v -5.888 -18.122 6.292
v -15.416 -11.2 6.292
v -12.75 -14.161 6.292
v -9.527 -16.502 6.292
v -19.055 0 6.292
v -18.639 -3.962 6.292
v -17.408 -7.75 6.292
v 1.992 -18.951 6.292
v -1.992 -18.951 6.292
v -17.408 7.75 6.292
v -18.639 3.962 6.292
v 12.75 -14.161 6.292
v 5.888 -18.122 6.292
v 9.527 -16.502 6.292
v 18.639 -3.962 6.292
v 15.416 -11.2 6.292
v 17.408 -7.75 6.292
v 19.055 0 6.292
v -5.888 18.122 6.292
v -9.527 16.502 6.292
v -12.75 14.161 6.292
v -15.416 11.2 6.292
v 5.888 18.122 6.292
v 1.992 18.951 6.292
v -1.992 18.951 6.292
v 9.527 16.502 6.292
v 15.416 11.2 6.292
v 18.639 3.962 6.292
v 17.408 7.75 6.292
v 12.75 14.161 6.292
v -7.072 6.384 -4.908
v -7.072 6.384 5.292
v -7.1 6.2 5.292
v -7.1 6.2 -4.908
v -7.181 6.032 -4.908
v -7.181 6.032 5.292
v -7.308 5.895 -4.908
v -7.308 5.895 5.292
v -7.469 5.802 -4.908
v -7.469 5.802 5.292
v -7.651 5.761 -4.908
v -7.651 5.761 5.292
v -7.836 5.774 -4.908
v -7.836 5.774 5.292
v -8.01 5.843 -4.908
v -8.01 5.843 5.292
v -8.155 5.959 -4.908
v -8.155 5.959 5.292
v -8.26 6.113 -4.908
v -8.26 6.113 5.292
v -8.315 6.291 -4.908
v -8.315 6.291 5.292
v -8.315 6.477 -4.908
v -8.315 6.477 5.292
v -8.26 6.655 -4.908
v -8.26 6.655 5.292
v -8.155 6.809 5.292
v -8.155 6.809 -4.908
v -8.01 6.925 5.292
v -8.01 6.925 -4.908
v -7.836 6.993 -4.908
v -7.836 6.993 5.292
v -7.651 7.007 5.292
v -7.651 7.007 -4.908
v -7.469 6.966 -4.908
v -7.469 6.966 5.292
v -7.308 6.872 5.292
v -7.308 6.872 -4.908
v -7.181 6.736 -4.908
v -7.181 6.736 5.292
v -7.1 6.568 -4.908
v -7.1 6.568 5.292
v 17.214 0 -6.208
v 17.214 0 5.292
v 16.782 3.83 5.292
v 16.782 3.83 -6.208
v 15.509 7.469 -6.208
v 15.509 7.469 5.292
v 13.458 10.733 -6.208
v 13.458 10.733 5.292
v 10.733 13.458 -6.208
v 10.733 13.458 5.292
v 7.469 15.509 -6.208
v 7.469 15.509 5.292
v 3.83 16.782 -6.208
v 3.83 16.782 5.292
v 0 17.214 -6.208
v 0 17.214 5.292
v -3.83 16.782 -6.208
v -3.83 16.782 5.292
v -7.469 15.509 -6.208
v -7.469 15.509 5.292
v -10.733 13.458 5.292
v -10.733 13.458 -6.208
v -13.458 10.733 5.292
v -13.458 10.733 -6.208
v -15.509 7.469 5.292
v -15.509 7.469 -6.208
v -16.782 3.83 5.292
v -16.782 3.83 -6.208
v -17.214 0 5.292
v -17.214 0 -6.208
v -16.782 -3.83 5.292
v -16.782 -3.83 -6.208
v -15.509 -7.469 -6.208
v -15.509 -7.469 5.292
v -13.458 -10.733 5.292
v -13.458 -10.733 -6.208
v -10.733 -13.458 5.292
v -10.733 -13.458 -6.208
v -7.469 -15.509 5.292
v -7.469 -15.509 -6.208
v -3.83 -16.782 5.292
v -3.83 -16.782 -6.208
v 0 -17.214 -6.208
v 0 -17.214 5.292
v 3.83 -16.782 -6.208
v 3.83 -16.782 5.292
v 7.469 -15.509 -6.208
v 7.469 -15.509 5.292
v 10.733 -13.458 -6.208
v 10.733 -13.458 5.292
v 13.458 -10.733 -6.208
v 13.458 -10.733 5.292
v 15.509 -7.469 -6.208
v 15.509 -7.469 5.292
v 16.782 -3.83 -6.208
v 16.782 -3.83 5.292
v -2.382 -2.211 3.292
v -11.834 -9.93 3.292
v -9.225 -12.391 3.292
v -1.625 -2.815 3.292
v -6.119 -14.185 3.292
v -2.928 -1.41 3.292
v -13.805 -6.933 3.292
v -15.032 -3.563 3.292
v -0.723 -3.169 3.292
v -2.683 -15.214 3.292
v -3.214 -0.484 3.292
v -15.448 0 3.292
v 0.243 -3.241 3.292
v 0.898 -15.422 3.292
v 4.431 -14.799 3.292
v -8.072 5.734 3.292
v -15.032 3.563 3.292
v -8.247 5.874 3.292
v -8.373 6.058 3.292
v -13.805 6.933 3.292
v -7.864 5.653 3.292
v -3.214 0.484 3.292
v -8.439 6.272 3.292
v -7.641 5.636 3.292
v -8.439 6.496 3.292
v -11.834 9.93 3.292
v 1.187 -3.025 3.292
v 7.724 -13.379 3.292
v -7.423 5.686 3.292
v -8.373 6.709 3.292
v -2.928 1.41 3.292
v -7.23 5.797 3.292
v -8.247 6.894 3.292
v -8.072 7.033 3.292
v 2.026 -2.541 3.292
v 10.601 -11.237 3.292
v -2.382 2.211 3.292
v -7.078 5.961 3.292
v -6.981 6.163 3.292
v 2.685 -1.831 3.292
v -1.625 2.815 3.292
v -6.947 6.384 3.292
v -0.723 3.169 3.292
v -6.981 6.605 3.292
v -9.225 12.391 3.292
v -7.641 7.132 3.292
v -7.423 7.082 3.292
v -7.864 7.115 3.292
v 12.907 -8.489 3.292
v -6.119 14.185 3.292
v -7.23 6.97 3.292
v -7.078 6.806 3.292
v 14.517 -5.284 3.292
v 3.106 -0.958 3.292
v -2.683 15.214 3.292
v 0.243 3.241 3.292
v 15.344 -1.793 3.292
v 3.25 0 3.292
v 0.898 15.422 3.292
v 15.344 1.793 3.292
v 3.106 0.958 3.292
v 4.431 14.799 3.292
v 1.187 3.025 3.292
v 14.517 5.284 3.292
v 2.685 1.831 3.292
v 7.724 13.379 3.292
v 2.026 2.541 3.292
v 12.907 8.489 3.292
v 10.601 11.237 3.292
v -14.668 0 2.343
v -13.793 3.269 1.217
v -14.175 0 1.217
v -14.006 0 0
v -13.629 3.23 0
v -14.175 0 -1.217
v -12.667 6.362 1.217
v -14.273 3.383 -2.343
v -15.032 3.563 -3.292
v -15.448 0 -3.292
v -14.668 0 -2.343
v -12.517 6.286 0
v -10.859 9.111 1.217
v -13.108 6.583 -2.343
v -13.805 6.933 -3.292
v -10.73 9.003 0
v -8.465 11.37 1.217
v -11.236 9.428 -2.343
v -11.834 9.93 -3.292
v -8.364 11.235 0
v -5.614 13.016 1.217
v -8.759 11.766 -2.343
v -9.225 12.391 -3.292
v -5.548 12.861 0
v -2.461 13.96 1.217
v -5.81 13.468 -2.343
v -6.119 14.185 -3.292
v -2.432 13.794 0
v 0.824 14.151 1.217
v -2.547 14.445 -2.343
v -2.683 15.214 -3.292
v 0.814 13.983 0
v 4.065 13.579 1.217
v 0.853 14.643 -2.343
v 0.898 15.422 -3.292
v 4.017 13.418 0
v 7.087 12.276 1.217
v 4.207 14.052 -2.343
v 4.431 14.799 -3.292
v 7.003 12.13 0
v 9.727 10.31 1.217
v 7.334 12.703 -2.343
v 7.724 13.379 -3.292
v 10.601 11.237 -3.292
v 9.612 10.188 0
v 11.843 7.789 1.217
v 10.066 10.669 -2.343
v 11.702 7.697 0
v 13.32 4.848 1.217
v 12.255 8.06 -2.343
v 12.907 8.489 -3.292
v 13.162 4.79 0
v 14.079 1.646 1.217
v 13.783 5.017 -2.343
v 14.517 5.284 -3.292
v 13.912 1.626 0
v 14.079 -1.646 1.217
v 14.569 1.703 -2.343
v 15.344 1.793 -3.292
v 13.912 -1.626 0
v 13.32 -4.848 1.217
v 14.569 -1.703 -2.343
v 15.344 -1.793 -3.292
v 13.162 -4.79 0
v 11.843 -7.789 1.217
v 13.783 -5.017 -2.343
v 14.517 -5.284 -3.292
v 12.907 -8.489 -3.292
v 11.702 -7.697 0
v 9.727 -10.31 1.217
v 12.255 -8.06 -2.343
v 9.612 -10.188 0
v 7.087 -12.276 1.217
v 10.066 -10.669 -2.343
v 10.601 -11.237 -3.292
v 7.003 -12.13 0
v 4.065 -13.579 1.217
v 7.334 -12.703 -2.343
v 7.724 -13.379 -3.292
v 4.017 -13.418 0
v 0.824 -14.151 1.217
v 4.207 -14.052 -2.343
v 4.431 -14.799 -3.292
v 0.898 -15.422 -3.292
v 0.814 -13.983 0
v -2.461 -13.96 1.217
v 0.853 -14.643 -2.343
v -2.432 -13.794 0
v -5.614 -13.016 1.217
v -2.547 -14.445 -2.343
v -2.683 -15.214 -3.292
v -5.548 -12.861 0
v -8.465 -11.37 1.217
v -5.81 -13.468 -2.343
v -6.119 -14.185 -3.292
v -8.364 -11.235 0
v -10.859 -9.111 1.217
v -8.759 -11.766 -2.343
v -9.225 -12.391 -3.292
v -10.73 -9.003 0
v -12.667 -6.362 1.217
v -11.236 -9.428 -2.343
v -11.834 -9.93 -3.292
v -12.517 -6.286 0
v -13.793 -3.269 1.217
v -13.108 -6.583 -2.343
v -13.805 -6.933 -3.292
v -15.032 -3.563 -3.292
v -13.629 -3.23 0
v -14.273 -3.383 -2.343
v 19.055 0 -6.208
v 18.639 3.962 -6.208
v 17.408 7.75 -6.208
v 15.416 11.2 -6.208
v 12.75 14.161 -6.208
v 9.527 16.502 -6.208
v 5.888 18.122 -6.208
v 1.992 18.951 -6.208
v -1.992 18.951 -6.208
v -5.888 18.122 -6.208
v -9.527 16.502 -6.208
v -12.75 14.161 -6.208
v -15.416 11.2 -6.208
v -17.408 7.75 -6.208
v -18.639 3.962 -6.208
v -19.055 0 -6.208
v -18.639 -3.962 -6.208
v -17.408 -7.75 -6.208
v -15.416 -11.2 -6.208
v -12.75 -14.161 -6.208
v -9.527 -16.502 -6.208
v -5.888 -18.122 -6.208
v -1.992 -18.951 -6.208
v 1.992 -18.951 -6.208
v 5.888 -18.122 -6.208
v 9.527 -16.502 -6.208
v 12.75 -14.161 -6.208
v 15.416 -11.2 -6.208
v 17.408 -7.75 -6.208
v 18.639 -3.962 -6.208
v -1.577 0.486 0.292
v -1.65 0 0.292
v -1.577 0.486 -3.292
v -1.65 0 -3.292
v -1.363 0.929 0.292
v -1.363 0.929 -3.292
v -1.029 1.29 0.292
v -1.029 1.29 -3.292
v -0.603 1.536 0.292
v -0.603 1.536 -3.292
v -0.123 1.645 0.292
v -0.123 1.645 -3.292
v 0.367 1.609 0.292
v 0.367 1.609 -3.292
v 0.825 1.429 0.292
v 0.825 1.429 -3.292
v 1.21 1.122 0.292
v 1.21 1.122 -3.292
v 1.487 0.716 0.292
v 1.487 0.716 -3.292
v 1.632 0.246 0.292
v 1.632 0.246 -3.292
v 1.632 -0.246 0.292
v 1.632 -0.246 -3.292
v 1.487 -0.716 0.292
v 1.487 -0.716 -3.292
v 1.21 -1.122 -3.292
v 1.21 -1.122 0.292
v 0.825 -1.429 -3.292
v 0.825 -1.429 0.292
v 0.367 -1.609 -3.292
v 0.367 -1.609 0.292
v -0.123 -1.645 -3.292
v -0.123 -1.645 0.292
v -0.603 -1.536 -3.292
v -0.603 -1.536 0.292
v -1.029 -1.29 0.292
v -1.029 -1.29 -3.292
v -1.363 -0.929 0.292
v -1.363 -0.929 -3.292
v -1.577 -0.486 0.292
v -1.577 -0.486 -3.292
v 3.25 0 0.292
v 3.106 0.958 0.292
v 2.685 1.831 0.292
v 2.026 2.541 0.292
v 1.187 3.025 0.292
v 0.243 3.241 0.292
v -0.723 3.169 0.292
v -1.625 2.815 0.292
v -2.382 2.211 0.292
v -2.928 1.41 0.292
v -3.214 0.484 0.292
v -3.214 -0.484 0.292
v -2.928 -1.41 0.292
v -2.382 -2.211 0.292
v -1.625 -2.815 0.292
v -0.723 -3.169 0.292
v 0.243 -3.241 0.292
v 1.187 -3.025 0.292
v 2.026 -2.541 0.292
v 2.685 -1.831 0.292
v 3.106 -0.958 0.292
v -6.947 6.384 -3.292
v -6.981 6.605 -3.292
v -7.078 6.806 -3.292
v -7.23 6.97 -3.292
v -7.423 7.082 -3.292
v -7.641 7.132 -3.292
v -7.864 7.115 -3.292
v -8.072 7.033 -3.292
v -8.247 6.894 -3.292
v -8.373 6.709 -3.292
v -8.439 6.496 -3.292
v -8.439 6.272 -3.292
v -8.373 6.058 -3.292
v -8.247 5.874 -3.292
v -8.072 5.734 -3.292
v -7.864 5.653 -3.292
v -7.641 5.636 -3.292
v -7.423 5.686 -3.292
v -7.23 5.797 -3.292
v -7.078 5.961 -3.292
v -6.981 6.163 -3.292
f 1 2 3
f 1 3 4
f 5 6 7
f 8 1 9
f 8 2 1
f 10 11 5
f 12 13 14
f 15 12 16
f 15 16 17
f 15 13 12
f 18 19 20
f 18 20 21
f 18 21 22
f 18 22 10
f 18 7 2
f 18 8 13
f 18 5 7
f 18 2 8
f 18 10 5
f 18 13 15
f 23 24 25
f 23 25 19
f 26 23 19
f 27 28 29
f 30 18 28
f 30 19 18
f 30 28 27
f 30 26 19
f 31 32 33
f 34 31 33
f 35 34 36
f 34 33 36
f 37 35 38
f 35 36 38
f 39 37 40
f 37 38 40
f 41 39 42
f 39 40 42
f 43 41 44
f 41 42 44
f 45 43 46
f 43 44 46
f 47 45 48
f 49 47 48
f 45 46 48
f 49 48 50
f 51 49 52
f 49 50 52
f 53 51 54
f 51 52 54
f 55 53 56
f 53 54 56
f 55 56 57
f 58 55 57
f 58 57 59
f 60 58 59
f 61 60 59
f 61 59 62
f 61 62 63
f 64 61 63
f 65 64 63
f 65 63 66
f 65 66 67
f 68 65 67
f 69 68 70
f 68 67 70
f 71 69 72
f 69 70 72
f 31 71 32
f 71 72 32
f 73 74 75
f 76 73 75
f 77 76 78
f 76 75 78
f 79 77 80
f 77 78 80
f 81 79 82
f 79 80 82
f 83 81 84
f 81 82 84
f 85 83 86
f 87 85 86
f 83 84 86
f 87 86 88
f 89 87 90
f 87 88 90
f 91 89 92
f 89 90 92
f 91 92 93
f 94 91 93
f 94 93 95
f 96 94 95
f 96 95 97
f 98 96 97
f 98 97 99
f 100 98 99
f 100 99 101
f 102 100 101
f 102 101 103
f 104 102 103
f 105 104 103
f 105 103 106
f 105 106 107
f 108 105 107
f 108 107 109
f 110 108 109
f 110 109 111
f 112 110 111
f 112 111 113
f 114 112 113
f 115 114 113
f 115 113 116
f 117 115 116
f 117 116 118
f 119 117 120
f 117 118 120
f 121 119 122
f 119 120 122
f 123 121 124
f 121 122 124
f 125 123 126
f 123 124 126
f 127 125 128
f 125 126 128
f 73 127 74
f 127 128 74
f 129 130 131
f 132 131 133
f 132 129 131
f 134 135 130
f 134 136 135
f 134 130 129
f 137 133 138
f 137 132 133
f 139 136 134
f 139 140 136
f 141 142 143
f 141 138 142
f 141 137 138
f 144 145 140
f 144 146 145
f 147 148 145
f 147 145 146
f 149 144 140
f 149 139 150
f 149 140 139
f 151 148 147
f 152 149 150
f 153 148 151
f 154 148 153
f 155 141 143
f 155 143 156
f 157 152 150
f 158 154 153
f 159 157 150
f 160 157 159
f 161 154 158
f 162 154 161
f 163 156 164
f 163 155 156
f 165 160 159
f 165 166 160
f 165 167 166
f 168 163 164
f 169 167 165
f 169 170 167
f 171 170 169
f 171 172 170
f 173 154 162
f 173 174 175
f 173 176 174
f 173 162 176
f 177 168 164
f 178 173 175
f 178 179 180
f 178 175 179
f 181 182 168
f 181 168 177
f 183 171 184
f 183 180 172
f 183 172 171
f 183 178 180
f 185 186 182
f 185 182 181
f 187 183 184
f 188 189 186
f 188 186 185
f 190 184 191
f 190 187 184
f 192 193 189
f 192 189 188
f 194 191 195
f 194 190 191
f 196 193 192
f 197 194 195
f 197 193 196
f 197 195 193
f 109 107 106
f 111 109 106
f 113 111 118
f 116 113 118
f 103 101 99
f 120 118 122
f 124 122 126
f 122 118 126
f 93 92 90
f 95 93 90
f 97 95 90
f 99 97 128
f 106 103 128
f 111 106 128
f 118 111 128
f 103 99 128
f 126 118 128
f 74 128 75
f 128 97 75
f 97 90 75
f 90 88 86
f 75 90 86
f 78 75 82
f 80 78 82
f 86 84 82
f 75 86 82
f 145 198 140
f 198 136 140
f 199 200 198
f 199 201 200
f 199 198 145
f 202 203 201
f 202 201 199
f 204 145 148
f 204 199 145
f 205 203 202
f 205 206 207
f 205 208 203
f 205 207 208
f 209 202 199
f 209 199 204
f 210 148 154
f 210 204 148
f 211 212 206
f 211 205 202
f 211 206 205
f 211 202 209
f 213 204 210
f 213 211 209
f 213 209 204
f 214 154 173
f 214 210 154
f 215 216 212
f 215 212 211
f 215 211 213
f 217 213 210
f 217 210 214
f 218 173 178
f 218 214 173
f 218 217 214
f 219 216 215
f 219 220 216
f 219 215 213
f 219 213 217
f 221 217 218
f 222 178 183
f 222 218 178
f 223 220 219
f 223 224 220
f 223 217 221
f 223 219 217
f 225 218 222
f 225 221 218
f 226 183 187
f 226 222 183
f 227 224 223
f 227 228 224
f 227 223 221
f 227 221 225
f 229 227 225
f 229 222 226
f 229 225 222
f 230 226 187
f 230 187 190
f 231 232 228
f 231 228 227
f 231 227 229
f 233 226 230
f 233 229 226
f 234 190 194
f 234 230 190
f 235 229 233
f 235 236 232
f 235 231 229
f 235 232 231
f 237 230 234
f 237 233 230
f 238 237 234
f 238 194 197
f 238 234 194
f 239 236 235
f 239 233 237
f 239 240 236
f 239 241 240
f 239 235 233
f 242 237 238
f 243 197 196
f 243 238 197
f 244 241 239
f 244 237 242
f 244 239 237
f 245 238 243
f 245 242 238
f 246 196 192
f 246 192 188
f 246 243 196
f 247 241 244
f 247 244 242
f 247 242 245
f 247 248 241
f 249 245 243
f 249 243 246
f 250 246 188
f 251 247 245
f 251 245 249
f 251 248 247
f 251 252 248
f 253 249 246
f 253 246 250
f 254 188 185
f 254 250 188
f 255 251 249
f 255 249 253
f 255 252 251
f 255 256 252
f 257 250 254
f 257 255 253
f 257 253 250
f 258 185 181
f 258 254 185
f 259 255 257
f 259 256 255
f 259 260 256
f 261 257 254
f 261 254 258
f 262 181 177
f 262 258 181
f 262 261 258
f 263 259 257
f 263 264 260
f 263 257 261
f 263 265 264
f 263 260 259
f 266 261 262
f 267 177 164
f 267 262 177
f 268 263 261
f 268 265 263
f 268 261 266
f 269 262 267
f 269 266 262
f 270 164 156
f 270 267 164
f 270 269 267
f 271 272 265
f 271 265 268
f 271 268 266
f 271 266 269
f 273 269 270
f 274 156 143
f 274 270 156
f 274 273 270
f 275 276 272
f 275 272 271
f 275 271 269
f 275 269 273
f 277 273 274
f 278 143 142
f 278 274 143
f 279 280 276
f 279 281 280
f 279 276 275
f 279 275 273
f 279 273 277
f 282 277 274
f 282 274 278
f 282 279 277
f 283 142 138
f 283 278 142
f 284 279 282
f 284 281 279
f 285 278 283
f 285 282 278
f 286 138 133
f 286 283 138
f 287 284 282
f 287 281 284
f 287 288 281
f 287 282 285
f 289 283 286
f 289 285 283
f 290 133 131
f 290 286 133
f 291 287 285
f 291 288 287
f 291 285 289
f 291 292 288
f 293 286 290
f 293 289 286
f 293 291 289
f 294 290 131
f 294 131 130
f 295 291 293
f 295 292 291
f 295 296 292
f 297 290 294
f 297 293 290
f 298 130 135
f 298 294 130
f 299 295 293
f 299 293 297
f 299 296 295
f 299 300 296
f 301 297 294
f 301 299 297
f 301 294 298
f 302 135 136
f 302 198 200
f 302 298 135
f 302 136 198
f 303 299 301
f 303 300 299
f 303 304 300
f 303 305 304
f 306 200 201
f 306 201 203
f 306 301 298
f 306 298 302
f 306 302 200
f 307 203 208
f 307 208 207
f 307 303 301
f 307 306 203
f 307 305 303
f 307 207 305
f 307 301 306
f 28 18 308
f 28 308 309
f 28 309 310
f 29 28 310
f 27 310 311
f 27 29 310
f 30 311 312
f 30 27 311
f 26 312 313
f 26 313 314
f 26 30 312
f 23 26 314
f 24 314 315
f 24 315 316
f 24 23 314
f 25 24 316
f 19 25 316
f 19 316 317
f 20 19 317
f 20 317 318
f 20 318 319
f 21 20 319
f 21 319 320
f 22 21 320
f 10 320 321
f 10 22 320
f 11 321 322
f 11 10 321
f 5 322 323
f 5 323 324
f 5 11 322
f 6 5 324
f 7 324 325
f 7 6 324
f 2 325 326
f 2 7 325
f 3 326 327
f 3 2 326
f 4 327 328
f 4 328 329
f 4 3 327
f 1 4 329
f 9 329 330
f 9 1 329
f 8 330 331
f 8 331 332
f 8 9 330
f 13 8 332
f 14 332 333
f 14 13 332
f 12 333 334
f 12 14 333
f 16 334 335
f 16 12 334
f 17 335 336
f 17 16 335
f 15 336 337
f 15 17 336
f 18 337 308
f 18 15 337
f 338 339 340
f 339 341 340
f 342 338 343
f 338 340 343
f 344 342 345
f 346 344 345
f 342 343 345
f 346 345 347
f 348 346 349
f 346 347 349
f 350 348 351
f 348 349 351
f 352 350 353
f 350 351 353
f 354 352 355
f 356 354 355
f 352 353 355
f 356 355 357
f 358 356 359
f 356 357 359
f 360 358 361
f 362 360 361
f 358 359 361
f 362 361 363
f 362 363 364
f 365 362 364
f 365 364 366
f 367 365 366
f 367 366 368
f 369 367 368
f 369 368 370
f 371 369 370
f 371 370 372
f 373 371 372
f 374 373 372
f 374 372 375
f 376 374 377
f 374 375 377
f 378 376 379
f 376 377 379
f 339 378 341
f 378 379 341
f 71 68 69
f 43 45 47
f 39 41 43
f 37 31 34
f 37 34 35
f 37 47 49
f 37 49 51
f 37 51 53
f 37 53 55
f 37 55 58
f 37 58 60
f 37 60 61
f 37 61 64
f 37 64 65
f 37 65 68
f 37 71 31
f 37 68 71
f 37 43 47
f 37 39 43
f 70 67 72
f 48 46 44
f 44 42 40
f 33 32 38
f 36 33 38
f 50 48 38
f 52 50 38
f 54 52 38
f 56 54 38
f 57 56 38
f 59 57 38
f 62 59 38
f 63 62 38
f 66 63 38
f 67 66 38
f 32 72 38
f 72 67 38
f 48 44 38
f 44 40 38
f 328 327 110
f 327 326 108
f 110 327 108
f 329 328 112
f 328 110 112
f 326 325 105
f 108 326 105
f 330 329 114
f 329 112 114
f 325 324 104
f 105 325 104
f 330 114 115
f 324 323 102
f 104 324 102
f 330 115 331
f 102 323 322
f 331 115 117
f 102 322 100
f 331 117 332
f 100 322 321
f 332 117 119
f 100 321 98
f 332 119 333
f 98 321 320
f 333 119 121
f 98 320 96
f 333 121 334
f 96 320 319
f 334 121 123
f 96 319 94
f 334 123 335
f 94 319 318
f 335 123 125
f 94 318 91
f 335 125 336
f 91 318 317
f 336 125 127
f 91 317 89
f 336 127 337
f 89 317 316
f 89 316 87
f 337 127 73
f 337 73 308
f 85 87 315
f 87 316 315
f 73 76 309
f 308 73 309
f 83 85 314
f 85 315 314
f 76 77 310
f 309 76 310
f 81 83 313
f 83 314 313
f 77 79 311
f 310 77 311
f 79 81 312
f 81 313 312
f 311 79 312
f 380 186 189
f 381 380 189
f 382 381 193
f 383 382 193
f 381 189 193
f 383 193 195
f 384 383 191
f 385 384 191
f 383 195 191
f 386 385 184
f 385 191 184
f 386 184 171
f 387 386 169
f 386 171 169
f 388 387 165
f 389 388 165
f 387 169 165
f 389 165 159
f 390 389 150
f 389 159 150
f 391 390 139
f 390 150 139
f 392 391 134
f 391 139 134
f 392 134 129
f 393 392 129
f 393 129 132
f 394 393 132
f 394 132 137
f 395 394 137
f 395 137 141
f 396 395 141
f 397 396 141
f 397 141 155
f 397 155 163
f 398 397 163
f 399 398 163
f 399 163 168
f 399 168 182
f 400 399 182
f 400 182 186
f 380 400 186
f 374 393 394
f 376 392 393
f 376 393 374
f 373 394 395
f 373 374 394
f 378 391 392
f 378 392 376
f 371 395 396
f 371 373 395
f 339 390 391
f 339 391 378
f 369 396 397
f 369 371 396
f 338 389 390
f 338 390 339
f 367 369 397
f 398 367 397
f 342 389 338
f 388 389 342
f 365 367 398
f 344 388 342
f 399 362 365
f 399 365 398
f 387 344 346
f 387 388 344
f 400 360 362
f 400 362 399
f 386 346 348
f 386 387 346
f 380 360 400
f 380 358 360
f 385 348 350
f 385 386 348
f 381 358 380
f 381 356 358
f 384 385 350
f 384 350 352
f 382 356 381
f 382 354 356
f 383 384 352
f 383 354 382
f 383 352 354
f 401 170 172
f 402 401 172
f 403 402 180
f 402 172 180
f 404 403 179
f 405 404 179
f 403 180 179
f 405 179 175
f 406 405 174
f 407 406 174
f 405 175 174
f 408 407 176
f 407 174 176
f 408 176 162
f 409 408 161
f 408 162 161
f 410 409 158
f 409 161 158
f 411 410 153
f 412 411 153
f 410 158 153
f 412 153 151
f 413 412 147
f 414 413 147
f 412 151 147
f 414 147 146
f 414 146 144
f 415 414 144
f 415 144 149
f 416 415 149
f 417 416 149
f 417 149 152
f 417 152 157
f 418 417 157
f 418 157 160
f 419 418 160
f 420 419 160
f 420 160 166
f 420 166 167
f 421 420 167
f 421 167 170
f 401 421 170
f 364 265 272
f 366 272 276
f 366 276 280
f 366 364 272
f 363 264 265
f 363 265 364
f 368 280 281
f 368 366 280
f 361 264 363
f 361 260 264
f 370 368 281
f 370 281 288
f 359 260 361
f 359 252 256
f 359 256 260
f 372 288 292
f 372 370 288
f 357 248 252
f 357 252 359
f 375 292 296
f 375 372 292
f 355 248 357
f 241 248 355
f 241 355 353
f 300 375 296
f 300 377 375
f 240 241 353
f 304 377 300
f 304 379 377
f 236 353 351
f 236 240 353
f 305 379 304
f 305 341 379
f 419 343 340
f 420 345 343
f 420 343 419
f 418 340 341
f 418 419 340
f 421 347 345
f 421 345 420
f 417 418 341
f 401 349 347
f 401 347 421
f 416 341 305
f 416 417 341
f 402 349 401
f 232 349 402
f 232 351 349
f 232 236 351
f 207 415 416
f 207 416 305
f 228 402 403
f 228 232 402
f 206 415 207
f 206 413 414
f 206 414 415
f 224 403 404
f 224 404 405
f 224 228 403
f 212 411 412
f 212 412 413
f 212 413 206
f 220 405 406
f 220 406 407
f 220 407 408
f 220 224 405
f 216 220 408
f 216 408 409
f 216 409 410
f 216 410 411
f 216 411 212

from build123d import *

# Parameters (mm, degrees)
F4_D           = 3.3
F4_CBORE_D     = 6.5
F4_CBORE_DEPTH = 3
F3_R           = 0.75
F5_DEPTH       = 25
F7_R           = 19.0549841128
F7_R_2         = 17.2138714766
F8_DEPTH       = 12.5
F9_DEPTH       = 1
F11_R          = 0.625
F12_DEPTH      = 10.2


with BuildPart() as f1:
    # F0 (on Front) → F1 (revolve)
    with BuildSketch(Plane.XZ):
        with BuildLine():
            ThreePointArc((-15.4482908223, 3.2919894022), (-14.0064014383, 0), (-15.4482908223, -3.2919894022))
            Line((-15.4482908223, -3.2919894022), (0, -3.2919894022))
            Line((0, -3.2919894022), (0, 3.2919894022))
            Line((0, 3.2919894022), (-15.4482908223, 3.2919894022))
        make_face()
    revolve(axis=Axis((0, 0, 0), (0, 0, -1)))

    # F4 (through all)
    with Locations(Plane.XY.offset(3.2919894022)):
        with Locations((0, 0)):
            CounterBoreHole(F4_D / 2, F4_CBORE_D / 2, F4_CBORE_DEPTH)

    # F3 (on offset) → F5 (cut)
    with BuildSketch(Plane.XY.offset(3.2919894022)):
        with Locations((-7.6972323188, 6.3837774578)):
            Circle(F3_R)
    extrude(amount=-F5_DEPTH, mode=Mode.SUBTRACT)


with BuildPart() as f8:
    # F7 (on offset) → F8 (new body)
    with BuildSketch(Plane.XY.offset(6.2919894022)):
        Circle(F7_R)
        Circle(F7_R_2, mode=Mode.SUBTRACT)
    extrude(amount=-F8_DEPTH)

    # F7 (on offset) → F9 (join)
    with BuildSketch(Plane.XY.offset(6.2919894022)):
        Circle(F7_R_2)
    extrude(amount=-F9_DEPTH)


with BuildPart() as f12:
    # F11 (on offset) → F12 (new body)
    with BuildSketch(Plane(origin=(0, 0, 5.2919894022), x_dir=(1, 0, 0), z_dir=(0, 0, -1))):
        with Locations((-7.6972323188, -6.3837774578)):
            Circle(F11_R)
    extrude(amount=F12_DEPTH)


solid = Compound([f1.part, f8.part, f12.part])
